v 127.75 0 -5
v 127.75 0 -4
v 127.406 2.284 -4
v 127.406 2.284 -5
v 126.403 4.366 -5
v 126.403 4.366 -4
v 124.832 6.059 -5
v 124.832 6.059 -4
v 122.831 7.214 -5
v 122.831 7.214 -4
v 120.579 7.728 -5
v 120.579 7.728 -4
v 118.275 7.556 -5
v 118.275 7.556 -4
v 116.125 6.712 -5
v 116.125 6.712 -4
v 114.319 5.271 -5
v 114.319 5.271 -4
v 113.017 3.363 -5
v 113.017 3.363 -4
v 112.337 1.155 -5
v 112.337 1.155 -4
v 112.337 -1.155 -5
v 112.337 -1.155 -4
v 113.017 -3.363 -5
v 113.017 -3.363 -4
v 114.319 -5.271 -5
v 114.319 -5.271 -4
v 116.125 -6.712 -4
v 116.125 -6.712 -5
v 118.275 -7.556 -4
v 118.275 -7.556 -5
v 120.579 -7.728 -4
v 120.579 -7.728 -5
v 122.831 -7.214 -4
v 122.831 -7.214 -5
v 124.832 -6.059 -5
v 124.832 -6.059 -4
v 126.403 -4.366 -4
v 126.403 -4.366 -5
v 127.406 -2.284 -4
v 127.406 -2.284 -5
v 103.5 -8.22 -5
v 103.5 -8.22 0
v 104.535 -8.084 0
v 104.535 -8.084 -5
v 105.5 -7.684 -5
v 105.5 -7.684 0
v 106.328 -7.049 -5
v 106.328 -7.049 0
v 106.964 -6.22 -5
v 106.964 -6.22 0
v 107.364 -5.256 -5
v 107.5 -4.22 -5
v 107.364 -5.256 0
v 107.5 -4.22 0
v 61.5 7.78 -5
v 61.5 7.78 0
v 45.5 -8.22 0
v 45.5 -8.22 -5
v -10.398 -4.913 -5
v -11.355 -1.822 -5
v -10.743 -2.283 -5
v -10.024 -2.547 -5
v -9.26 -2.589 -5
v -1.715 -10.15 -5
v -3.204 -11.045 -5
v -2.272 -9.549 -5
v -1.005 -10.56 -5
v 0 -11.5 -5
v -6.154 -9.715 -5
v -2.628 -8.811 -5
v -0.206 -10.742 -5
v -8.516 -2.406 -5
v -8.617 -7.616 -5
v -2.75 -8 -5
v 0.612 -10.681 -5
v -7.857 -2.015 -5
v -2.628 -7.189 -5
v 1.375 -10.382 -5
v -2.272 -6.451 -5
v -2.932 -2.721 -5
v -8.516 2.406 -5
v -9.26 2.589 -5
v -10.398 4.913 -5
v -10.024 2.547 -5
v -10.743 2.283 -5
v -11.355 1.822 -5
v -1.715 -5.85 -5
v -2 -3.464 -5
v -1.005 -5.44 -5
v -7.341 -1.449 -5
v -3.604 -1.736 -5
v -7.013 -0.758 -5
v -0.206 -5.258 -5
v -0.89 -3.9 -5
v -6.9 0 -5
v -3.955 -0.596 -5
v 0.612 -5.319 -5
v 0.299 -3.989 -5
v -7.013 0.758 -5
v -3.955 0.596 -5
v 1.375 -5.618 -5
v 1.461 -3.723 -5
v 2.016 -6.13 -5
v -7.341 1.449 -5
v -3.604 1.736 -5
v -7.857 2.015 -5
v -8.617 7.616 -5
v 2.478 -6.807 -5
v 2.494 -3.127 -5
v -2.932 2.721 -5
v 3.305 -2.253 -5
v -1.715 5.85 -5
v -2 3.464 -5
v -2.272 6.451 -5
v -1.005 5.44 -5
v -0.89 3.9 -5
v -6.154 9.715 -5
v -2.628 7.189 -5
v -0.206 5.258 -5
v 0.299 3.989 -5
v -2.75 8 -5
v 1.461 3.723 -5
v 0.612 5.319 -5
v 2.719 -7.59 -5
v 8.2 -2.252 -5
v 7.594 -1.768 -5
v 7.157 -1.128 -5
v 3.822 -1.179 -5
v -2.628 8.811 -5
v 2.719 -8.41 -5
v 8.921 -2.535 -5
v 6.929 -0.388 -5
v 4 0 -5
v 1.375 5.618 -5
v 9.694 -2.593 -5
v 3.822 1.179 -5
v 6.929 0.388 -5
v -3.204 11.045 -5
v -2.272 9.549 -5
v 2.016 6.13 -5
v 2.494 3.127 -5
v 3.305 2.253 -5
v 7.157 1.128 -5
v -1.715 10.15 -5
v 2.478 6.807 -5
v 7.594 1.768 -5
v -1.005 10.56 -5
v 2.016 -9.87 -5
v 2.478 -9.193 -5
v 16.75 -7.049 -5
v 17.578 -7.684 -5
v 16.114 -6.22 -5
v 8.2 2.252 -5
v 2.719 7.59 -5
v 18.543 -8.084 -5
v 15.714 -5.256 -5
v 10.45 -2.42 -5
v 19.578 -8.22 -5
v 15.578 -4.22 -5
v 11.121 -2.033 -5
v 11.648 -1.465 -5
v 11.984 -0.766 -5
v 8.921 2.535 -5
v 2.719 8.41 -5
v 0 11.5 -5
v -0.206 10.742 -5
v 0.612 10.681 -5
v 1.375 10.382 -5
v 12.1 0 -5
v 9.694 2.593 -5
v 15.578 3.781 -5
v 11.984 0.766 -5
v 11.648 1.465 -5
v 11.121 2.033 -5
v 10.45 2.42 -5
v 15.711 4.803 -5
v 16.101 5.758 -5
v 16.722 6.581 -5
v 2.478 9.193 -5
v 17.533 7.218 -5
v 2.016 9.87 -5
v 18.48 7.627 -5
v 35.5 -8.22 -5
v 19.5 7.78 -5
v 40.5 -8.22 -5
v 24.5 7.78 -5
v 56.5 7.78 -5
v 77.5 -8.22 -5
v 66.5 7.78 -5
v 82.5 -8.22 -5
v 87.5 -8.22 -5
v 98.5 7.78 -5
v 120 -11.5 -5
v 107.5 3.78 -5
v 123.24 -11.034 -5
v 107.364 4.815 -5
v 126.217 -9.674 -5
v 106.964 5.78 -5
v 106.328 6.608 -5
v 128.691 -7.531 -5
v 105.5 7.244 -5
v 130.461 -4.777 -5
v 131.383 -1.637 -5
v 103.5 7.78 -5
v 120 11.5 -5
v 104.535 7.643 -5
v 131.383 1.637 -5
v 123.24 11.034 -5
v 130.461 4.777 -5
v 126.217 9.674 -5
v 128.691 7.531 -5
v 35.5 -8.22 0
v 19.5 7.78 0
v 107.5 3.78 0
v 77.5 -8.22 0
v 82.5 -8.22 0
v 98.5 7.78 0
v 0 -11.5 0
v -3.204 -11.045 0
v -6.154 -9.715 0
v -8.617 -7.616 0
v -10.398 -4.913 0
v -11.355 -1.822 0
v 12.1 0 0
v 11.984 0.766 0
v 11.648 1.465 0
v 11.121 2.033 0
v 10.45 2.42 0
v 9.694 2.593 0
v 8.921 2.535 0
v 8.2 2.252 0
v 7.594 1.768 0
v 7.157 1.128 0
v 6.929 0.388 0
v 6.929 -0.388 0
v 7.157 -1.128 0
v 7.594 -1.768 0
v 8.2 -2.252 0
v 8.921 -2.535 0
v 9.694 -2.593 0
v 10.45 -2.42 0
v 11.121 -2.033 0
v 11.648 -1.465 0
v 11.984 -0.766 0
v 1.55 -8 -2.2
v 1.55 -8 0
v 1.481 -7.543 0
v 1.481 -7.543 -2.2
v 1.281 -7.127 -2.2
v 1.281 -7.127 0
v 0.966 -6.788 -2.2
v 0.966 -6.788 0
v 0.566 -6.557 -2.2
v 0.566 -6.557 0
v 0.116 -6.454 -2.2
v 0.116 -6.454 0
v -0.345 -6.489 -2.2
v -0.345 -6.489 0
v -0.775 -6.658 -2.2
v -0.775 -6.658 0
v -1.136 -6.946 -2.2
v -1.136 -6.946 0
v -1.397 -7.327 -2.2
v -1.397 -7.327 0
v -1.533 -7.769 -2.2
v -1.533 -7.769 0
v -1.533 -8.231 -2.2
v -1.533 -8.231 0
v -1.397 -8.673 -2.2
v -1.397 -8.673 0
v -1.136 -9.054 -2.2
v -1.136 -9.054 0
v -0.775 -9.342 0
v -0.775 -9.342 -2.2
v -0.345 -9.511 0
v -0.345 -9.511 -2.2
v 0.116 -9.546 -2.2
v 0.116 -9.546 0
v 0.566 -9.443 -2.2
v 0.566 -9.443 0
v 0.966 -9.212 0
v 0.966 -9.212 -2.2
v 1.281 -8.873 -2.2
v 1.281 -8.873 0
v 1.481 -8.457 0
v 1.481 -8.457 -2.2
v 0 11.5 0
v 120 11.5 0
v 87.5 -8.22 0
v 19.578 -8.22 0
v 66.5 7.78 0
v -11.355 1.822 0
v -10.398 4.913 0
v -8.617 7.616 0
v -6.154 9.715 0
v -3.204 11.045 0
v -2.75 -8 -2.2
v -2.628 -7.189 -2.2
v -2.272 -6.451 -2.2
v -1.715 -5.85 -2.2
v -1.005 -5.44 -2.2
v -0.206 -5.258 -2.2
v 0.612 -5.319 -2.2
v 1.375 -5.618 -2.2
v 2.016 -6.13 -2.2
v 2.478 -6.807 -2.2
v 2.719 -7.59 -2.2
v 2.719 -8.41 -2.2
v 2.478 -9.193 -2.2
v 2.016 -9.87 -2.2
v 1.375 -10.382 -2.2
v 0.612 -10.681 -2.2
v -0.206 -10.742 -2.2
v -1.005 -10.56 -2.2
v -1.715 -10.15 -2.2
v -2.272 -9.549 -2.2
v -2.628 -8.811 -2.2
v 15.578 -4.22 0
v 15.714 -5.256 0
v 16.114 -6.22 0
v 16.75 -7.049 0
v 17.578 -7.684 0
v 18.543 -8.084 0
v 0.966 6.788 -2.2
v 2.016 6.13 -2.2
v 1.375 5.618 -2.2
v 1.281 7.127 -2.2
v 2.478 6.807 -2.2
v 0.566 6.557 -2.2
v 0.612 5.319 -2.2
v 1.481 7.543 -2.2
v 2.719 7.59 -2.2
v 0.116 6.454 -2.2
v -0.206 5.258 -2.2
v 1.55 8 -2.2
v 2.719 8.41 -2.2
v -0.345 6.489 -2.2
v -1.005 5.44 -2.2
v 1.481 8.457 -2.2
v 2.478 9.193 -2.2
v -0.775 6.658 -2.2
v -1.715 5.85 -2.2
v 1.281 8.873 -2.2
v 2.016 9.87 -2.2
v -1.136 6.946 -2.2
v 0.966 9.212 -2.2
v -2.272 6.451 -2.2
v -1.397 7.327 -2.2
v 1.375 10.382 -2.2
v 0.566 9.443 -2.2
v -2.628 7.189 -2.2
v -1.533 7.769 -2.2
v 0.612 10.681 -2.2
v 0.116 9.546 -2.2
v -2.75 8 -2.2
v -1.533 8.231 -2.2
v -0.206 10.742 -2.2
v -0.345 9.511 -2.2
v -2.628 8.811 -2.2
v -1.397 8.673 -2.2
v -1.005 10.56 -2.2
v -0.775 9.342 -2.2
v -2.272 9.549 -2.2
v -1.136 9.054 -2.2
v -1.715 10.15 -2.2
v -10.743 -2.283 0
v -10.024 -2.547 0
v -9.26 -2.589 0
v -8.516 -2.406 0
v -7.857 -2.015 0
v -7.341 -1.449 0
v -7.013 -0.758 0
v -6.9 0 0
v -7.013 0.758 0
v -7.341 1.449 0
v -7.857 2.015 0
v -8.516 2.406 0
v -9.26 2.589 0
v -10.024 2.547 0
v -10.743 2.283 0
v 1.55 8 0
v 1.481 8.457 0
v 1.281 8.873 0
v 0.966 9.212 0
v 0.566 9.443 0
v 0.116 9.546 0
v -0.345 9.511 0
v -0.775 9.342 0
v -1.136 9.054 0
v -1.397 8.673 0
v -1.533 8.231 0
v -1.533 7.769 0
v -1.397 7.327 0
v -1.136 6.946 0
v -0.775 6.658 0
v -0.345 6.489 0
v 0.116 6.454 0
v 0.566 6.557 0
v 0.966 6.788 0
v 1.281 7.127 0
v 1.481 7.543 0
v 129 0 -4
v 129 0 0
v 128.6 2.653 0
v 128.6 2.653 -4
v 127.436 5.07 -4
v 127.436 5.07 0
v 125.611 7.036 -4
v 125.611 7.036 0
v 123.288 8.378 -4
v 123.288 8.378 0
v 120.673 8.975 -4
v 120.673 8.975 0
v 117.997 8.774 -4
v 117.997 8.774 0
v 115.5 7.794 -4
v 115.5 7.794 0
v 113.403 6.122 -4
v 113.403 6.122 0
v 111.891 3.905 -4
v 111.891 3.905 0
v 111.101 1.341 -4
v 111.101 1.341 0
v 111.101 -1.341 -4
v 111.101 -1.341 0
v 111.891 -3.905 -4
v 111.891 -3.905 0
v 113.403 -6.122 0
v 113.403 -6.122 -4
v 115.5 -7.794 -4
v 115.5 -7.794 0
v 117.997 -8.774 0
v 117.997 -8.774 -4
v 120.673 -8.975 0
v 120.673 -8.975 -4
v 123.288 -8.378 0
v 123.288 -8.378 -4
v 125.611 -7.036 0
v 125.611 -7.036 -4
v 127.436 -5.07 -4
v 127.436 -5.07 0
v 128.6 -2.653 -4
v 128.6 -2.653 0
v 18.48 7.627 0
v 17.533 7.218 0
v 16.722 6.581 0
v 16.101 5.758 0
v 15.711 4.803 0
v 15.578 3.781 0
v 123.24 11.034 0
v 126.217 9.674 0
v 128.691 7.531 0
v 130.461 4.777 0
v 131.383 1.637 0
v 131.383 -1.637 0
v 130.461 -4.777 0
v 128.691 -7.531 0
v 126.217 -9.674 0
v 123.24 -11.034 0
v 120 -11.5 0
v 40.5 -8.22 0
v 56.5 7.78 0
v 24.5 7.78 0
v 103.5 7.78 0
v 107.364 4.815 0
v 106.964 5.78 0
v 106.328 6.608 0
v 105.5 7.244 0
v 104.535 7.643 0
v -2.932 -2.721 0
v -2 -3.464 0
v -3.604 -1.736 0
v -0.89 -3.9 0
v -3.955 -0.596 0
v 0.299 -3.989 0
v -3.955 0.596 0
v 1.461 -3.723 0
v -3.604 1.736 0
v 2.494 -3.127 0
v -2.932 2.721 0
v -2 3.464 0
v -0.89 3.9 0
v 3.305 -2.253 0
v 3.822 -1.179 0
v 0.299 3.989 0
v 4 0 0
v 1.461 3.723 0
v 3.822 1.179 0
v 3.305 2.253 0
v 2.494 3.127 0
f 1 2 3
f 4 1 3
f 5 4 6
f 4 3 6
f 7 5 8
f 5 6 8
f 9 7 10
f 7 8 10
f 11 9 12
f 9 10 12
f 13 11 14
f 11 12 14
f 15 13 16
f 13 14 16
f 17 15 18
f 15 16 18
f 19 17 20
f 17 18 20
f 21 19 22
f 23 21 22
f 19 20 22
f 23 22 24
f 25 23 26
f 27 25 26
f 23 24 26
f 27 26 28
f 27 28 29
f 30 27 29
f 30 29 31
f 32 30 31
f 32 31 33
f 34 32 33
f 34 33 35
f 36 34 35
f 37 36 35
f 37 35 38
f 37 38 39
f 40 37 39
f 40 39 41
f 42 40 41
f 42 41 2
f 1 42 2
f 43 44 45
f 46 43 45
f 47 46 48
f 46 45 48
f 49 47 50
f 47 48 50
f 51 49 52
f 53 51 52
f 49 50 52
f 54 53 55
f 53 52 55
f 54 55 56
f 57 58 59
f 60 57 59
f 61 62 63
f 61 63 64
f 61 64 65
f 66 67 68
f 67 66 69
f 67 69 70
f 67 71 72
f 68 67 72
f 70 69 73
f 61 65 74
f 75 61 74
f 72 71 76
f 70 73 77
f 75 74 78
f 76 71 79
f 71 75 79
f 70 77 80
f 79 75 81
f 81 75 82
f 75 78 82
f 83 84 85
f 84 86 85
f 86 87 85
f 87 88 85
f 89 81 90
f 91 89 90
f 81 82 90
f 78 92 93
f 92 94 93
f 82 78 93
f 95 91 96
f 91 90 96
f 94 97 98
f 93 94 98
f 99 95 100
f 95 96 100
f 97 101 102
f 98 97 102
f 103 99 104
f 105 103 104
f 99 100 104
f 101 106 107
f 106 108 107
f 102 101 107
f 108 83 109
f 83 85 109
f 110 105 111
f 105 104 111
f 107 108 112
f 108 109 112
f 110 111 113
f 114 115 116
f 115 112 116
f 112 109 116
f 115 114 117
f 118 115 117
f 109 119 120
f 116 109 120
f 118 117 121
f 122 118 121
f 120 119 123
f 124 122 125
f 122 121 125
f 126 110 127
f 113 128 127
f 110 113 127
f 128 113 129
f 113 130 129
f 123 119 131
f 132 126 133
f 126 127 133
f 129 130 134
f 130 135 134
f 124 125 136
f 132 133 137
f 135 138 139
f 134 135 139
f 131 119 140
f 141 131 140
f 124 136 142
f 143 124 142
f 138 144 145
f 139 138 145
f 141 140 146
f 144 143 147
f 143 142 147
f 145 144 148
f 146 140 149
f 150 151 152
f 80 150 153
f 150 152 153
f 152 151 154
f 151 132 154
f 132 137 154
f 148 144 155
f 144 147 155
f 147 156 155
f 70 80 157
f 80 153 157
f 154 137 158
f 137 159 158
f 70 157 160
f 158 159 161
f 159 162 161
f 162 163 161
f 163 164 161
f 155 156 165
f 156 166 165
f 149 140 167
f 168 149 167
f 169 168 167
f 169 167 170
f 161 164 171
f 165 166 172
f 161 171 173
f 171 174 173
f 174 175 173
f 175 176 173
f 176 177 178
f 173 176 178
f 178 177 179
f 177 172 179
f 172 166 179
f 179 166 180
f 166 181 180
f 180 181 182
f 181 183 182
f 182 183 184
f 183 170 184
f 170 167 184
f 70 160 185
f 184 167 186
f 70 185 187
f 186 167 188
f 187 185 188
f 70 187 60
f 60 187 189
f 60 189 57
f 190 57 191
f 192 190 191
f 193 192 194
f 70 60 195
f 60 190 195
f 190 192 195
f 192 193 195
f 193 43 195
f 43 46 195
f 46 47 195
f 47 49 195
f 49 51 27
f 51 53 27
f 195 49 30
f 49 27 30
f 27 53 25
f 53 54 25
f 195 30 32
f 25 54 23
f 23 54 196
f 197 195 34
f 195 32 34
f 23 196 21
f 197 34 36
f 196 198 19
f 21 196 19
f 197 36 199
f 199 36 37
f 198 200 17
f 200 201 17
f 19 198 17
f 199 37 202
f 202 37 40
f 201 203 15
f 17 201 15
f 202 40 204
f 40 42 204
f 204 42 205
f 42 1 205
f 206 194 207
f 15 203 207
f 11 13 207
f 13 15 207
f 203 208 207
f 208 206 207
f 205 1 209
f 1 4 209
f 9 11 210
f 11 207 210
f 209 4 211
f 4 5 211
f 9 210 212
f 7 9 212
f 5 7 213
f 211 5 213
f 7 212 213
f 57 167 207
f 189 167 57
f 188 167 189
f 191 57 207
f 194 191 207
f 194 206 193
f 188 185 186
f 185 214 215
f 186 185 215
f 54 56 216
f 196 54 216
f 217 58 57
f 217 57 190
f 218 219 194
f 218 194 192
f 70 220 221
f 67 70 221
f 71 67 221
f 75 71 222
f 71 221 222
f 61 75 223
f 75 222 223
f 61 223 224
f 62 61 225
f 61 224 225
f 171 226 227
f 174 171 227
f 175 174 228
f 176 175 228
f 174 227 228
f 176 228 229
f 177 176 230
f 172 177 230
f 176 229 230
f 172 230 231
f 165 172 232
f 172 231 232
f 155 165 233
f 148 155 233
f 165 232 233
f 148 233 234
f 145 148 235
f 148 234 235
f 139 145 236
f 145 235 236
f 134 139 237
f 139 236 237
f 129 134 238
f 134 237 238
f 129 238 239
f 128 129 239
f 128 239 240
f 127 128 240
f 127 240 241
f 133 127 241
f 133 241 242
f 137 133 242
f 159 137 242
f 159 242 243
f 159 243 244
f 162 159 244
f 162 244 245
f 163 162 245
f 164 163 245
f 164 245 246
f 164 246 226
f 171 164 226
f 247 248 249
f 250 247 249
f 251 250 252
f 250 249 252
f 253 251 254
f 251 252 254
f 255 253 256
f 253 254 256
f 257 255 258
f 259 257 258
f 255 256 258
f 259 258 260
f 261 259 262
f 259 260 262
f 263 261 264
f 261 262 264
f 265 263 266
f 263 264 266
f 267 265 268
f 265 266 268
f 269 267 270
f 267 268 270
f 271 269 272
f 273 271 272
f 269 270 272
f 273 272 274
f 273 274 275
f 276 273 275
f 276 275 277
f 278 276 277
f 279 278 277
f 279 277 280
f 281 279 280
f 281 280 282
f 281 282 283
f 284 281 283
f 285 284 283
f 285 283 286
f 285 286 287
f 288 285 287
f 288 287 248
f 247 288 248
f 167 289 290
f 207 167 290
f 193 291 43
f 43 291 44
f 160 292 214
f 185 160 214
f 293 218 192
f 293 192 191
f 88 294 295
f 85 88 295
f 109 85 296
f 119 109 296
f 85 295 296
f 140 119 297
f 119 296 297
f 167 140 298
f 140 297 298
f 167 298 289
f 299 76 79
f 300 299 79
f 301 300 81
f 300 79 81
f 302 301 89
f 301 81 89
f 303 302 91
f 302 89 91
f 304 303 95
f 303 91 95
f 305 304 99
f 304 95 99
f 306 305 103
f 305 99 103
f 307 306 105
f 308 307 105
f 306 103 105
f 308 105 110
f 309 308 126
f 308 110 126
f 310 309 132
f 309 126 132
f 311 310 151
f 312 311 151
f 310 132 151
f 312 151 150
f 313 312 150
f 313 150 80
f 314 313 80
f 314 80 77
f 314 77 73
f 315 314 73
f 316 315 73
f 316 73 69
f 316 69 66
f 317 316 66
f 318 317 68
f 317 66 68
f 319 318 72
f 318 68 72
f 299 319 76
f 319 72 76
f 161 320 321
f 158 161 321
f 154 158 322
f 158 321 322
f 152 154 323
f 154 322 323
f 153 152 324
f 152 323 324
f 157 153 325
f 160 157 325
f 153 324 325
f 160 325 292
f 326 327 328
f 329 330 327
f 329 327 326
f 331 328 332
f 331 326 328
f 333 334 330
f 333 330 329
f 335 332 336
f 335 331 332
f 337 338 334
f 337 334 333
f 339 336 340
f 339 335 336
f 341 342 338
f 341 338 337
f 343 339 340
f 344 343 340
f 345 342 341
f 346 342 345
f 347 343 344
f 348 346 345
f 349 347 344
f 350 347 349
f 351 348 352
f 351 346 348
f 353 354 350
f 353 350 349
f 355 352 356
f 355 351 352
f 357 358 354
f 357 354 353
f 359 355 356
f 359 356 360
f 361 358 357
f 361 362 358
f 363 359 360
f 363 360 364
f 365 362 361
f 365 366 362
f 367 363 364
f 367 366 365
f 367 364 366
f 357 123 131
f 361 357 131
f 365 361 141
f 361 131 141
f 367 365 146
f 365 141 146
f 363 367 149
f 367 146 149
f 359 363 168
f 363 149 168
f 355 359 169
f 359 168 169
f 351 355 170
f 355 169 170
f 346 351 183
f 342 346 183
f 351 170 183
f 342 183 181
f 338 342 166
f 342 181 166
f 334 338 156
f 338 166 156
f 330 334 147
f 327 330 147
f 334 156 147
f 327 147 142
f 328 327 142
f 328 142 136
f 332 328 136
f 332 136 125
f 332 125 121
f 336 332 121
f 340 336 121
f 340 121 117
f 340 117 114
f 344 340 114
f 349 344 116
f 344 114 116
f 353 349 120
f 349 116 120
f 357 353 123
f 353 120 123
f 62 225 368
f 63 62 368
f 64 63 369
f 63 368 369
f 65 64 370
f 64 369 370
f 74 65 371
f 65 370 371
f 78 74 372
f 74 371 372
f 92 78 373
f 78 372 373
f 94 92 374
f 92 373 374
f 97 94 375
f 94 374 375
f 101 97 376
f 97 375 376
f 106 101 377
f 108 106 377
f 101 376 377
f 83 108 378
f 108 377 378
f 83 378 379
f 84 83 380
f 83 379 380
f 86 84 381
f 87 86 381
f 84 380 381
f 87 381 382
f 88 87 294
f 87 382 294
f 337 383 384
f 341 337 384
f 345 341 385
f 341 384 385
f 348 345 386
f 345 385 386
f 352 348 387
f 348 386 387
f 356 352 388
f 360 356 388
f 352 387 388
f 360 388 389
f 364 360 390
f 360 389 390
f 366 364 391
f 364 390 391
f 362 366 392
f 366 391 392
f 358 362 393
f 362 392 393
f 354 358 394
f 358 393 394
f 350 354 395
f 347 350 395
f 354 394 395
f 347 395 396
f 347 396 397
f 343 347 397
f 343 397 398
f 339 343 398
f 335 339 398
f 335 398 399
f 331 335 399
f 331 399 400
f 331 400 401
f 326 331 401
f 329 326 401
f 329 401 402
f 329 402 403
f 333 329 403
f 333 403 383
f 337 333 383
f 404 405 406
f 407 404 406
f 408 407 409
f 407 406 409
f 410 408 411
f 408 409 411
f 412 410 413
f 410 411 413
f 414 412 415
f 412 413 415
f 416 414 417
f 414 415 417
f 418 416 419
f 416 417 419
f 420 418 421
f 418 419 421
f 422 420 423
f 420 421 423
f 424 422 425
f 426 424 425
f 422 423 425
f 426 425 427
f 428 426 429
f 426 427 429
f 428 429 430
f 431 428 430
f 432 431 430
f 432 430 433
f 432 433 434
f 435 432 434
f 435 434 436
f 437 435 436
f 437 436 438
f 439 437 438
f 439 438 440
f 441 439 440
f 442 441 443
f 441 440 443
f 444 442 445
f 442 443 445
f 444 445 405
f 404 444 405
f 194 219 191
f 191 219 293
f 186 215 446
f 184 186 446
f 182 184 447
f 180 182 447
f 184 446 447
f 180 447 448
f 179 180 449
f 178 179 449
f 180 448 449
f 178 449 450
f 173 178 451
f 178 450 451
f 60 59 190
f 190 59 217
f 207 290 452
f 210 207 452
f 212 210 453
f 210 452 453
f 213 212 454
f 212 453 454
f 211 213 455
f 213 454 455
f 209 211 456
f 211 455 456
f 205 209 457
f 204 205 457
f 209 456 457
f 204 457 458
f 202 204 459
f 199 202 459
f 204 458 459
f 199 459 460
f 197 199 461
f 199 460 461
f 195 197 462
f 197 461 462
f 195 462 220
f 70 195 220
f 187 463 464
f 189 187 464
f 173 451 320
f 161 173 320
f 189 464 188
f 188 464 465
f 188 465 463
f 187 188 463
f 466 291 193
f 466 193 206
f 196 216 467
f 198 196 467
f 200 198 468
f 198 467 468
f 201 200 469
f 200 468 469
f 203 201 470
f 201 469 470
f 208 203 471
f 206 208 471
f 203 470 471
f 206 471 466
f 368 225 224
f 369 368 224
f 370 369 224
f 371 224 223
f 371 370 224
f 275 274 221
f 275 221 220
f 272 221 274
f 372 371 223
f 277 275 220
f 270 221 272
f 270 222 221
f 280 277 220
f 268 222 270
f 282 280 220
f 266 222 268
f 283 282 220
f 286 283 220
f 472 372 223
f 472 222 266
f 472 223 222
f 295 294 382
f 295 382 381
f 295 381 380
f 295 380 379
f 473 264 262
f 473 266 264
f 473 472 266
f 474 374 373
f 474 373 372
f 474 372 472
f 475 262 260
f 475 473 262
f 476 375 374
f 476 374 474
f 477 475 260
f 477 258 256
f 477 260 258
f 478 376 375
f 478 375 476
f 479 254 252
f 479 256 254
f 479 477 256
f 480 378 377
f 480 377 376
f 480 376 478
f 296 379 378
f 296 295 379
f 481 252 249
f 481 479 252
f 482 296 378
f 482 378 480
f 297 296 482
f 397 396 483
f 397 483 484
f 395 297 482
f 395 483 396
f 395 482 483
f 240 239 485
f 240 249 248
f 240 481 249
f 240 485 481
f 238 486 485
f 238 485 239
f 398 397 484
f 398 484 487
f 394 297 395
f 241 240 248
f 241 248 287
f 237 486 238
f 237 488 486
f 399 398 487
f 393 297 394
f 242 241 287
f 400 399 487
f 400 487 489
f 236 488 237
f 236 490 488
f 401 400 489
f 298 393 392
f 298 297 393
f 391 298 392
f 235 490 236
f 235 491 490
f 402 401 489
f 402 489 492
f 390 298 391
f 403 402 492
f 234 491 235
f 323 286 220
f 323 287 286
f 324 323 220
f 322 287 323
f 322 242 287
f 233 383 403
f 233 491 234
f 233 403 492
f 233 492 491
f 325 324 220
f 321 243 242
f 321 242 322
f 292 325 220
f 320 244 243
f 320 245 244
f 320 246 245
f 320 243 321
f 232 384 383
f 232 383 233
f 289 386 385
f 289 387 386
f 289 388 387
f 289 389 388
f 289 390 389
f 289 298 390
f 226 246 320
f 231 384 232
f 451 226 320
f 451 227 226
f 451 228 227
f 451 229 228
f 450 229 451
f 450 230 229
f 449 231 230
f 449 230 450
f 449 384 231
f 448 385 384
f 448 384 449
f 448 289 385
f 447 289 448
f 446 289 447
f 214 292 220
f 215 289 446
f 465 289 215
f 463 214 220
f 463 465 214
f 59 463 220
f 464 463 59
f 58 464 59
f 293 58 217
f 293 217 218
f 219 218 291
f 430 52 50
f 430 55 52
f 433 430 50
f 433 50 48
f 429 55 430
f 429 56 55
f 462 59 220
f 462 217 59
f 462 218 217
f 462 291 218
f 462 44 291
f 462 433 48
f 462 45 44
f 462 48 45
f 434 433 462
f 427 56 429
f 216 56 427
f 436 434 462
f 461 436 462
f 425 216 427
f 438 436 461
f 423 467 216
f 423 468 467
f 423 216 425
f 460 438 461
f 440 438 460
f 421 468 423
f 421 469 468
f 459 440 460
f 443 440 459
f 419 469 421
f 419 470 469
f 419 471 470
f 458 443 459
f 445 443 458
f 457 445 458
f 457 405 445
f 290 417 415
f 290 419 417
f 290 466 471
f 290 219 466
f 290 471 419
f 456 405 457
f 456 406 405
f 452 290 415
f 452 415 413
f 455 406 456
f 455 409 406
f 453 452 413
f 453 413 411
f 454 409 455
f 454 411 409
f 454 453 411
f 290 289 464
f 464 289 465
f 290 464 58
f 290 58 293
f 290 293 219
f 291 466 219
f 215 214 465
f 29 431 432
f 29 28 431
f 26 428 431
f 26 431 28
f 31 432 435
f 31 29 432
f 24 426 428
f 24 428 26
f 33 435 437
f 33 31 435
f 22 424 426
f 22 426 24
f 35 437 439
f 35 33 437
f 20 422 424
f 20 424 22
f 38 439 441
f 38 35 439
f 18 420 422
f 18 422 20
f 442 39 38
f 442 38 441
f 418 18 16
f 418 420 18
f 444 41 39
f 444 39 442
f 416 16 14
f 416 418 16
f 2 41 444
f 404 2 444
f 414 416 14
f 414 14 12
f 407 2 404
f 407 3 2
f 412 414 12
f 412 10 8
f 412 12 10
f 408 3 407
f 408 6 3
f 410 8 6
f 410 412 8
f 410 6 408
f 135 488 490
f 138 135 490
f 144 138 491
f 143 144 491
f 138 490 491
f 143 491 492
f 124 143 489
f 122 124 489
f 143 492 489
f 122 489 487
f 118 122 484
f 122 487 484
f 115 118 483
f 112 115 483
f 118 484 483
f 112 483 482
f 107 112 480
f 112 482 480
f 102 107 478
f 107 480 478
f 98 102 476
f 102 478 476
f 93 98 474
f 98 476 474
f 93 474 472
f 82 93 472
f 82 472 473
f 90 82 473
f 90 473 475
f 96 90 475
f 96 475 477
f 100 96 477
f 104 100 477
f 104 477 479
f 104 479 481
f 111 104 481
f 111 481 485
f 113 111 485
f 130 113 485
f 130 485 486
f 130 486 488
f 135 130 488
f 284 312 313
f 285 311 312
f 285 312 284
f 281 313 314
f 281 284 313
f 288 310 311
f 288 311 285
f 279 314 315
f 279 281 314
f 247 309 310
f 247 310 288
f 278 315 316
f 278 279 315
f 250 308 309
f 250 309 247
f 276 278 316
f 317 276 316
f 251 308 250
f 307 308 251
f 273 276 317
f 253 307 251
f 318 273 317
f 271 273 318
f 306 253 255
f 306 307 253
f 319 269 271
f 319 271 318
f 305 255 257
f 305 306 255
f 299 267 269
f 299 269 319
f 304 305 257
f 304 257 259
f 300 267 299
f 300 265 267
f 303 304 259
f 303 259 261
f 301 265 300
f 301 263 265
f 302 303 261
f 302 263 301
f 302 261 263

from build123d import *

# Parameters (mm, degrees)
BOSS_EXTRUDE1_DEPTH = 5
SKETCH2_R           = 9
CUT_EXTRUDE1_DEPTH  = 4
SKETCH3_R           = 7.75
CUT_EXTRUDE2_DEPTH  = 15
SKETCH4_R           = 4
CUT_EXTRUDE3_DEPTH  = 15
SKETCH5_R           = 1.55
CUT_EXTRUDE4_DEPTH  = 15
SKETCH6_R           = 2.6
CUT_EXTRUDE5_DEPTH  = 15
CUT_EXTRUDE7_DEPTH  = 15
CUT_EXTRUDE8_DEPTH  = 10
SKETCH9_R           = 2.75
CUT_EXTRUDE10_DEPTH = 2.8
BOSS_EXTRUDE2_DEPTH = 5


with BuildPart() as part:
    # Sketch1 → Boss-Extrude1 (new body)
    with BuildSketch(Plane.XY):
        with BuildLine():
            Line((0, 11.5), (120, 11.5))
            ThreePointArc((120, 11.5), (131.5, 0), (120, -11.5))
            Line((120, -11.5), (0, -11.5))
            ThreePointArc((0, -11.5), (-11.5, 0), (0, 11.5))
        make_face()
    extrude(amount=-BOSS_EXTRUDE1_DEPTH)

    # Sketch2 → Cut-Extrude1 (cut)
    with BuildSketch(Plane.XY):
        with Locations((120, 0)):
            Circle(SKETCH2_R)
    extrude(amount=-CUT_EXTRUDE1_DEPTH, mode=Mode.SUBTRACT)

    # Sketch3 → Cut-Extrude2 (cut)
    with BuildSketch(Plane.XY):
        with Locations((120, 0)):
            Circle(SKETCH3_R)
    extrude(amount=-CUT_EXTRUDE2_DEPTH, mode=Mode.SUBTRACT)

    # Sketch4 → Cut-Extrude3 (cut)
    with BuildSketch(Plane.XY):
        Circle(SKETCH4_R)
    extrude(amount=-CUT_EXTRUDE3_DEPTH, mode=Mode.SUBTRACT)

    # Sketch5 → Cut-Extrude4 (cut)
    with BuildSketch(Plane.XY):
        with Locations((0, 8)):
            Circle(SKETCH5_R)
        with Locations((0, -8)):
            Circle(SKETCH5_R)
    extrude(amount=-CUT_EXTRUDE4_DEPTH, mode=Mode.SUBTRACT)

    # Sketch6 → Cut-Extrude5 (cut)
    with BuildSketch(Plane.XY):
        with Locations((-9.5, 0)):
            Circle(SKETCH6_R)
        with Locations((9.5, 0)):
            Circle(SKETCH6_R)
    extrude(amount=-CUT_EXTRUDE5_DEPTH, mode=Mode.SUBTRACT)

    # Sketch8 → Cut-Extrude7 (cut)
    with BuildSketch(Plane.XY):
        with BuildLine():
            ThreePointArc((103.5, -8.220260856), (106.328427125, -7.048687981), (107.5, -4.220260856))
            Line((107.5, -4.220260856), (107.5, 3.779739144))
            ThreePointArc((107.5, 3.779739144), (106.328427125, 6.608166269), (103.5, 7.779739144))
            Line((103.5, 7.779739144), (61.5, 7.779739144))
            Line((61.5, 7.779739144), (77.5, -8.220260856))
            Line((77.5, -8.220260856), (103.5, -8.220260856))
        make_face()
        with BuildLine():
            Line((35.5, -8.220260856), (19.5, 7.779739144))
            ThreePointArc((19.5, 7.779739144), (16.722169997, 6.581192541), (15.578063312, 3.780500952))
            Line((15.578063312, 3.780500952), (15.578063312, -4.220260856))
            ThreePointArc((15.578063312, -4.220260856), (16.749636187, -7.048687981), (19.578063312, -8.220260856))
            Line((19.578063312, -8.220260856), (35.5, -8.220260856))
        make_face()
    extrude(amount=-CUT_EXTRUDE7_DEPTH, mode=Mode.SUBTRACT)

    # Sketch8<3> → Cut-Extrude8 (cut)
    with BuildSketch(Plane.XY):
        Polygon((40.5, -8.220260856), (56.5, 7.779739144), (24.5, 7.779739144), align=None)
        Polygon((77.5, -8.220260856), (61.5, 7.779739144), (45.5, -8.220260856), align=None)
    extrude(amount=-CUT_EXTRUDE8_DEPTH, mode=Mode.SUBTRACT)

    # Sketch9 → Cut-Extrude10 (cut)
    with BuildSketch(Plane(origin=(0, 0, -5), x_dir=(-1, 0, 0), z_dir=(0, 0, -1))):
        with Locations((0, 8)):
            Circle(SKETCH9_R)
        with Locations((0, -8)):
            Circle(SKETCH9_R)
    extrude(amount=-CUT_EXTRUDE10_DEPTH, mode=Mode.SUBTRACT)

    # Sketch8<4> → Boss-Extrude2 (add)
    with BuildSketch(Plane.XY):
        Polygon((82.5, -8.220260856), (66.5, 7.779739144), (61.5, 7.779739144), (77.5, -8.220260856), align=None)
        Polygon((87.5, -8.220260856), (103.5, 7.779739144), (98.5, 7.779739144), (82.5, -8.220260856), align=None)
    extrude(amount=-BOSS_EXTRUDE2_DEPTH)


solid = part.part
